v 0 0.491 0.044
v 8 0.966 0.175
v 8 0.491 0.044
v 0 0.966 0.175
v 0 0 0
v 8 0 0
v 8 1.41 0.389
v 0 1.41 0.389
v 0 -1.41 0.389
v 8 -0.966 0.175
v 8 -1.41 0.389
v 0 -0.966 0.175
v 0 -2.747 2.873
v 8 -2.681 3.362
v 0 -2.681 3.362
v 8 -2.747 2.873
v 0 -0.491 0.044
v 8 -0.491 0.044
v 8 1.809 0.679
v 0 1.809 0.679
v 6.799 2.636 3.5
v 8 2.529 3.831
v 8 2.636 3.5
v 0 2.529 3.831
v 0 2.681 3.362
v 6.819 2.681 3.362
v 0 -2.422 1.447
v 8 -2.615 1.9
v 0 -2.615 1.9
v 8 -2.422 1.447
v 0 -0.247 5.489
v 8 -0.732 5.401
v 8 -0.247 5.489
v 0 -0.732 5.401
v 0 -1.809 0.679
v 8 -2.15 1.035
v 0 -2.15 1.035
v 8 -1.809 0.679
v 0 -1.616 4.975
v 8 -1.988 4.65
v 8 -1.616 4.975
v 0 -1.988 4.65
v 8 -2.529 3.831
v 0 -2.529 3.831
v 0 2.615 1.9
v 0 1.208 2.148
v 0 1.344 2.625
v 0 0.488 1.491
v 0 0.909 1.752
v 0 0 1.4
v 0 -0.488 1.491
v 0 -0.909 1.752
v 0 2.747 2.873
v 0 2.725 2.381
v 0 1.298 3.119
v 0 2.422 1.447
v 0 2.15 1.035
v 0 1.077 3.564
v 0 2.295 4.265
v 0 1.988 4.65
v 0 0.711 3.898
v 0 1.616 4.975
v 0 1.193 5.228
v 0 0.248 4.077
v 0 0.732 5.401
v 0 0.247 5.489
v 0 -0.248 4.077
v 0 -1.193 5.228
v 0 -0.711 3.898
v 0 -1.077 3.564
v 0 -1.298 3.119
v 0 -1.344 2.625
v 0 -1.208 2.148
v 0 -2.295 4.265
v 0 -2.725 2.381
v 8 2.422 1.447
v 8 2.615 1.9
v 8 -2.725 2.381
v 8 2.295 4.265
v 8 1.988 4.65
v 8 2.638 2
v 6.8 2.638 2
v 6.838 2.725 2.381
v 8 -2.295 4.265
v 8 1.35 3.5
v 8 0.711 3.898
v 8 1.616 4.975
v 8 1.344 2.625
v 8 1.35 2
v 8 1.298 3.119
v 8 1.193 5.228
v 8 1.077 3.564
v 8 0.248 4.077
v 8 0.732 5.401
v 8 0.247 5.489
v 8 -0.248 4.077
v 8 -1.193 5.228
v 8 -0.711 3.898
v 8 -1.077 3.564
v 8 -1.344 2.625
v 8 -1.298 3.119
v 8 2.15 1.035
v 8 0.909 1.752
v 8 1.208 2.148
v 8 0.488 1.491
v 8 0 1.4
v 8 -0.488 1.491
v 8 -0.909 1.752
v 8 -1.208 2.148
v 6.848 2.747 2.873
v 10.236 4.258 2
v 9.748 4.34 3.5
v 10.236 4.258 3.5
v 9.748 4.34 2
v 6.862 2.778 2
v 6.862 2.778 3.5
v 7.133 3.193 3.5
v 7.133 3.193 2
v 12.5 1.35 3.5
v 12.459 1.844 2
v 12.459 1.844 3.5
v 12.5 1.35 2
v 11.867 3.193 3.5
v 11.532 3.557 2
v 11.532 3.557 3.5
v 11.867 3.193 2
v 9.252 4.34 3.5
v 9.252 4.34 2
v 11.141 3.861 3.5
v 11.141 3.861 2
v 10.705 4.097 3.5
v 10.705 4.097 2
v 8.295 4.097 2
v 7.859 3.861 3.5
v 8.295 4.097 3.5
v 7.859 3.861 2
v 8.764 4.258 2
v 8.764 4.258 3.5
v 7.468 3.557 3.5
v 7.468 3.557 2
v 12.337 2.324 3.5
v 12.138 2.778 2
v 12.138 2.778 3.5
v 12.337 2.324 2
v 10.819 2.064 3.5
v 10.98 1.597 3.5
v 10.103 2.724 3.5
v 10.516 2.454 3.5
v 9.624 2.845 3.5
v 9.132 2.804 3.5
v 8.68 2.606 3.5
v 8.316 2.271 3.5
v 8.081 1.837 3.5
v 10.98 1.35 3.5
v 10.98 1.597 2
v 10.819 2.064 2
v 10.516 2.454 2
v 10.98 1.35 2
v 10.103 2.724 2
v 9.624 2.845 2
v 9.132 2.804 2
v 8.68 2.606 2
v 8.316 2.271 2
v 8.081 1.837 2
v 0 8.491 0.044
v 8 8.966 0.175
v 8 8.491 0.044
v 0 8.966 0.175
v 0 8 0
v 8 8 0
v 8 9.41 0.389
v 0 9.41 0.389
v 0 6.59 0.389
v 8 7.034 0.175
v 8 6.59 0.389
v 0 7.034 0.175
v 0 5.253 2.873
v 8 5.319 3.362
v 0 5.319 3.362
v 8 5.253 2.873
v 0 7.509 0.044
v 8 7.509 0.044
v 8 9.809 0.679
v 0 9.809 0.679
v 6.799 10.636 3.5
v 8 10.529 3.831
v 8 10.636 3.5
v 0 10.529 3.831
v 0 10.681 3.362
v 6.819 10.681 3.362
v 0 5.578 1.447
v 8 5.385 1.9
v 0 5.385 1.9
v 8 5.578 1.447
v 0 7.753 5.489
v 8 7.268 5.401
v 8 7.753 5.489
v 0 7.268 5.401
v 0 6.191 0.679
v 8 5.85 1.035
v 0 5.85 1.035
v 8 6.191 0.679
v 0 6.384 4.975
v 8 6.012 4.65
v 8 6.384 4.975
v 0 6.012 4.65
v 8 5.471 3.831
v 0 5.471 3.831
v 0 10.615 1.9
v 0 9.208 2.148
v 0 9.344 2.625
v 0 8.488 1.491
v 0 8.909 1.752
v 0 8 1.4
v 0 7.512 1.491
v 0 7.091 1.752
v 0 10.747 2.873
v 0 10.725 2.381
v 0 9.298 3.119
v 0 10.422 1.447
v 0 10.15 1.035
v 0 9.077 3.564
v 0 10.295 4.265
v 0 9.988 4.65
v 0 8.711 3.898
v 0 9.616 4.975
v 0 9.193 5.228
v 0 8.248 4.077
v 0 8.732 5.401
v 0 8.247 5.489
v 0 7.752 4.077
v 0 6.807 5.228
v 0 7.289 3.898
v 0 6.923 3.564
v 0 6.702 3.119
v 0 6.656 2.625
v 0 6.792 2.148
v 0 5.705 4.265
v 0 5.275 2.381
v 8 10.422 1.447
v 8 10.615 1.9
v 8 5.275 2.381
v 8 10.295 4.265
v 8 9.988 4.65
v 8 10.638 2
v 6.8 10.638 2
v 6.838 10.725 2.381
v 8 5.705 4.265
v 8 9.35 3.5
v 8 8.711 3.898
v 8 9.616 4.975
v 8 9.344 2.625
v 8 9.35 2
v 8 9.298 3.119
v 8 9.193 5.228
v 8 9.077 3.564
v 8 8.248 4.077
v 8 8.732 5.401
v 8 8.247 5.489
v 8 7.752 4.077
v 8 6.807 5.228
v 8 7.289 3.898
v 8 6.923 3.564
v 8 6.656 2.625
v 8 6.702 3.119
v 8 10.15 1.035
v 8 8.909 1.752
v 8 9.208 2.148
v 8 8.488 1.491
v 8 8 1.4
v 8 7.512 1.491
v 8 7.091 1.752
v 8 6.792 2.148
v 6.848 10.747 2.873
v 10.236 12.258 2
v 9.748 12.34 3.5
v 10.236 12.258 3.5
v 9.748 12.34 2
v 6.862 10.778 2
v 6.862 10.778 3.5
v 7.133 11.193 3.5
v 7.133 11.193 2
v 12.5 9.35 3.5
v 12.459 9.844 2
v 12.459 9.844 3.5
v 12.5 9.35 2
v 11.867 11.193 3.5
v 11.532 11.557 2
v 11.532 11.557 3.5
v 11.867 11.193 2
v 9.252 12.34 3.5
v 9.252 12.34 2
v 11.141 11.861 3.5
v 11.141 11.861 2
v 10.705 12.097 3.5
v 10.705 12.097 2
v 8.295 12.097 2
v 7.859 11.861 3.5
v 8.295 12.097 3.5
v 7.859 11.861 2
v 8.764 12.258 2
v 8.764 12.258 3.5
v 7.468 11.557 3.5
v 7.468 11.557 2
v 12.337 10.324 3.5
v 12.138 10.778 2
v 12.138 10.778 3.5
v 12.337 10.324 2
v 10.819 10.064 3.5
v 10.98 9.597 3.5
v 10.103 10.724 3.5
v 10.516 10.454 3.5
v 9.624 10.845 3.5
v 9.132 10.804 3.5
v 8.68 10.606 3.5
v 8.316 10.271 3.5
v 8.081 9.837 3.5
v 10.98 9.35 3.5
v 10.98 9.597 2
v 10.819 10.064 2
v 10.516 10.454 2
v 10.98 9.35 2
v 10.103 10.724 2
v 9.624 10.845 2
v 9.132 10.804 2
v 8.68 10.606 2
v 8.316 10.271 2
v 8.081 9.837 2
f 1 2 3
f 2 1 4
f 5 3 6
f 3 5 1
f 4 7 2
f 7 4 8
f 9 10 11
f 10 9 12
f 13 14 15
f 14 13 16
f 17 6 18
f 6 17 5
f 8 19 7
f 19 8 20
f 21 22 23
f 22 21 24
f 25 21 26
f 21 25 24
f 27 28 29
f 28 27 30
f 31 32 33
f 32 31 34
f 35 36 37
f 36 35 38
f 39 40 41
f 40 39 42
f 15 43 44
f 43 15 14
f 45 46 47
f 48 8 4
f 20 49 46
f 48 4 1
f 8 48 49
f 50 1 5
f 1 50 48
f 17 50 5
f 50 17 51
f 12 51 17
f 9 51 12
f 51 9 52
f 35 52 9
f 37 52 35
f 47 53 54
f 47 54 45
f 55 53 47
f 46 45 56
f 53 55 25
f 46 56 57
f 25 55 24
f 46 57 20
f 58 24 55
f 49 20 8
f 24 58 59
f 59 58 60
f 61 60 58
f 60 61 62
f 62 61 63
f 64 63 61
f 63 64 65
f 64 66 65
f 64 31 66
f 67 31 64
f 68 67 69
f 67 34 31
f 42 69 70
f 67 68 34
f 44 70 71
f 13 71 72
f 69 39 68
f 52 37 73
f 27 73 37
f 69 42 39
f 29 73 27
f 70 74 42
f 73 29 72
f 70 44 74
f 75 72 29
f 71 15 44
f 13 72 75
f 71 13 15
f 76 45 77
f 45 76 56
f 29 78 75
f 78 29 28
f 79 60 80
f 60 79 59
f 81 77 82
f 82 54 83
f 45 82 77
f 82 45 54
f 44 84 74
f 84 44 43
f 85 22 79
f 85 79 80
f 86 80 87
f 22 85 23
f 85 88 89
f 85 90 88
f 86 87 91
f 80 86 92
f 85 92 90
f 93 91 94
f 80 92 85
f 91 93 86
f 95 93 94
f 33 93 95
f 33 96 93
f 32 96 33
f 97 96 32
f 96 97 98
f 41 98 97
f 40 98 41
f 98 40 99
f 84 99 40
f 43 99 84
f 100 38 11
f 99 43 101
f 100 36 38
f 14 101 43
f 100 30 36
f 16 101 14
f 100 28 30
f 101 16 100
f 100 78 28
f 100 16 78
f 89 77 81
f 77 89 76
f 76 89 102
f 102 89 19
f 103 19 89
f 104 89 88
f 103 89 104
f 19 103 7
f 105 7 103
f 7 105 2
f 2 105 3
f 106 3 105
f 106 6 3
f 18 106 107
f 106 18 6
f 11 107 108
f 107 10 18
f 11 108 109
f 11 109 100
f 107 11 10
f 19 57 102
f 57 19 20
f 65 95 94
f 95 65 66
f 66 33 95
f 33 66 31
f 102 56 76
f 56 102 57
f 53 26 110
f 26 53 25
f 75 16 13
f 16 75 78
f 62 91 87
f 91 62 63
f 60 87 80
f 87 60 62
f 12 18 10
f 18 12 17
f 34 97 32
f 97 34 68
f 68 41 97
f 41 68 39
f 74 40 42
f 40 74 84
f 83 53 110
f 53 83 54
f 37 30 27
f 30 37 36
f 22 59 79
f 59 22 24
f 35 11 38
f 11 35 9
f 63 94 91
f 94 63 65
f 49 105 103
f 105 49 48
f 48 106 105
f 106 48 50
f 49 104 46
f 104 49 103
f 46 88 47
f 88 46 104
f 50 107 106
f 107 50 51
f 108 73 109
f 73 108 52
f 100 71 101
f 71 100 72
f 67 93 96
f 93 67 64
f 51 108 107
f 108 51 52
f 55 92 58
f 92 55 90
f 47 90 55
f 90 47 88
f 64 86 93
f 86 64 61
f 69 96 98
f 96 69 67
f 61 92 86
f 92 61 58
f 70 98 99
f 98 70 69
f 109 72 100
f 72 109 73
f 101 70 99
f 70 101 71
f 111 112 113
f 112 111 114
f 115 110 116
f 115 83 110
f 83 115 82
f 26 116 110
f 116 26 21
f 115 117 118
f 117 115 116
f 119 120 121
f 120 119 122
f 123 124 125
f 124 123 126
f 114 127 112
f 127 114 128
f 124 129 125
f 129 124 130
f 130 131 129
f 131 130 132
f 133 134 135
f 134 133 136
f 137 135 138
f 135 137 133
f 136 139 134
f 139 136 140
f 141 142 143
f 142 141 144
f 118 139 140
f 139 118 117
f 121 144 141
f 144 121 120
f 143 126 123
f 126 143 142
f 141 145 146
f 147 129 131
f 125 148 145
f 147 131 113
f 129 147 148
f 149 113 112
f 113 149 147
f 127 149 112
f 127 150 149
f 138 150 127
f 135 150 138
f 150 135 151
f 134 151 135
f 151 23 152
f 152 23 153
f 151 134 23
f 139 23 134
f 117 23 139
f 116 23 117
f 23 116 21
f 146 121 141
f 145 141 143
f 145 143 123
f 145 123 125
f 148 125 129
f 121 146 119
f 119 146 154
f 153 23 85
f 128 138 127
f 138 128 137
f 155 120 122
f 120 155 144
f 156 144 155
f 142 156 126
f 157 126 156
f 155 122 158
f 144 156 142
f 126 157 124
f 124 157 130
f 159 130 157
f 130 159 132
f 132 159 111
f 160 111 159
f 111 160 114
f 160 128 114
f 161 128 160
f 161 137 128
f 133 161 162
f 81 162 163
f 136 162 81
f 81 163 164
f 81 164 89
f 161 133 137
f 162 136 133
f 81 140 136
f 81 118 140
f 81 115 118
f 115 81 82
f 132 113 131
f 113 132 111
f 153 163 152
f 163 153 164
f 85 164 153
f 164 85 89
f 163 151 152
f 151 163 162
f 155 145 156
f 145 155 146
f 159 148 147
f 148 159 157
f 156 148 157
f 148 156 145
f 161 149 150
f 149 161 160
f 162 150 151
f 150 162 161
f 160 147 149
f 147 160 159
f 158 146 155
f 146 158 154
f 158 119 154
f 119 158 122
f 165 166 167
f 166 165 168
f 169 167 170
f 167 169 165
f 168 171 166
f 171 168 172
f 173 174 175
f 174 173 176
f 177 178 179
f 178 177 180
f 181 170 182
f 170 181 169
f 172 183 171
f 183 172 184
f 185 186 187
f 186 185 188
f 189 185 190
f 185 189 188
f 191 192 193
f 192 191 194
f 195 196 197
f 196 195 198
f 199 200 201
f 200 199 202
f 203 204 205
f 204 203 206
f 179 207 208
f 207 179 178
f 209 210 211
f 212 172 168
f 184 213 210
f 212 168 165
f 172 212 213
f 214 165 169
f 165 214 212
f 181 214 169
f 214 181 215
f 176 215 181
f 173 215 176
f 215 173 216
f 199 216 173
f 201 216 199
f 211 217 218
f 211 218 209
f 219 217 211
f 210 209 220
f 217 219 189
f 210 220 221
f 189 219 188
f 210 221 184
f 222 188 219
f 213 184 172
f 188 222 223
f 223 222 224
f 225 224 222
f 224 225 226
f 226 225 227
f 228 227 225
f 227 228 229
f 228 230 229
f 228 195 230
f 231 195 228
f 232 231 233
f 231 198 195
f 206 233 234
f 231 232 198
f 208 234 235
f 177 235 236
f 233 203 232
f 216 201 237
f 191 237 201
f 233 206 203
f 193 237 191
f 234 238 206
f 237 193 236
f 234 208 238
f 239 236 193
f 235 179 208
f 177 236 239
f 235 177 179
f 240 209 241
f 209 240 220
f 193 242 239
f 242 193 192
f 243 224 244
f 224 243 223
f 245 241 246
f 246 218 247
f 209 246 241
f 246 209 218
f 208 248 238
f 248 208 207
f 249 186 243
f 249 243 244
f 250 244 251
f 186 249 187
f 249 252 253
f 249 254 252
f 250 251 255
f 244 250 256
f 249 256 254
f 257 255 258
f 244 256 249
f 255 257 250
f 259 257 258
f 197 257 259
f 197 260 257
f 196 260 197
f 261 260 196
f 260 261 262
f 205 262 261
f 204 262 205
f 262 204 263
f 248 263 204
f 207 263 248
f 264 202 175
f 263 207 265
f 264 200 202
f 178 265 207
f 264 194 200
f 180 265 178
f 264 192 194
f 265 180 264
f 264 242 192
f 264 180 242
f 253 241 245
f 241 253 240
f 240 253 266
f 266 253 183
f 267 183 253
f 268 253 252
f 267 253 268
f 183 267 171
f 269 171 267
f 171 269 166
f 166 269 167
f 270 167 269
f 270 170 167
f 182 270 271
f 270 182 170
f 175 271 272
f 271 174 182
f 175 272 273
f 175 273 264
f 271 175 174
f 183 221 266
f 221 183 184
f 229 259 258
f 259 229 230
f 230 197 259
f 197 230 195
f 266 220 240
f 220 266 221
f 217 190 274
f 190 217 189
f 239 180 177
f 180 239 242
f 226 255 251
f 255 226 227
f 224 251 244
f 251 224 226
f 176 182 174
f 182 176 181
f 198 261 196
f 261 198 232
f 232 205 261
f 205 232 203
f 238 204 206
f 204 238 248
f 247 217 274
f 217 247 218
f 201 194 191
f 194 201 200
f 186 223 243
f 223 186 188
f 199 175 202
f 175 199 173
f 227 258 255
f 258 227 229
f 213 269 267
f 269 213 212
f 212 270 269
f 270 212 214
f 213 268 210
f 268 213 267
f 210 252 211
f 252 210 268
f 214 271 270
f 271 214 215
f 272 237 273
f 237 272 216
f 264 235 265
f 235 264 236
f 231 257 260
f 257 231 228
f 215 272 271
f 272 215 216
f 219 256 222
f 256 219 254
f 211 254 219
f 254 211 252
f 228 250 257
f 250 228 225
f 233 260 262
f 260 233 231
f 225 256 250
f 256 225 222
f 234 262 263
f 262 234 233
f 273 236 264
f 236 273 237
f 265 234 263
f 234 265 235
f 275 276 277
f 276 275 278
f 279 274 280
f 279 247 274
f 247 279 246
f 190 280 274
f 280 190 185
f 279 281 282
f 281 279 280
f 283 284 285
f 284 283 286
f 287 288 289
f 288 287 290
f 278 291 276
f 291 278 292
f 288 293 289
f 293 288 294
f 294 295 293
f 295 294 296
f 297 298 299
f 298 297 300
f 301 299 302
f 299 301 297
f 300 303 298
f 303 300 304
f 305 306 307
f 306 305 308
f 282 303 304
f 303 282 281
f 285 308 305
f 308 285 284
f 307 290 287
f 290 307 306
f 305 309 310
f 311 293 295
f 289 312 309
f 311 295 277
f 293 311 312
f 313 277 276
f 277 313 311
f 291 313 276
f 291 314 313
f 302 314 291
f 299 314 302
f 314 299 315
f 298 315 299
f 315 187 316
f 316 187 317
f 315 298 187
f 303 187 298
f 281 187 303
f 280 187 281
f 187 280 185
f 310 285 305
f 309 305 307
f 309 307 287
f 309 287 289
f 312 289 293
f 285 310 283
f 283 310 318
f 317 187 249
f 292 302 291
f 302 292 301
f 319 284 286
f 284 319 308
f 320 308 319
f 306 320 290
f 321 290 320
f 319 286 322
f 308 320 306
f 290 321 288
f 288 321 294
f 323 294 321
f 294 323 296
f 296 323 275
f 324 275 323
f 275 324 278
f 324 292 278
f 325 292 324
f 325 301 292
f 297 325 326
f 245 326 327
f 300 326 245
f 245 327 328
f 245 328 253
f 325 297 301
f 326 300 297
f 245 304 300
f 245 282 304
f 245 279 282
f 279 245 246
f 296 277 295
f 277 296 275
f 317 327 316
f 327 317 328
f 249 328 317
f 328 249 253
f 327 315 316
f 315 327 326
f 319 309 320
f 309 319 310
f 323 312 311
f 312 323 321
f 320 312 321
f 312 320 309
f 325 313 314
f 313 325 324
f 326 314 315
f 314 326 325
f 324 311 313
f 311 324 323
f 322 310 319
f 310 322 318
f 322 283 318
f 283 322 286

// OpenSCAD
$fa=4;
$fs=0.5;

inner = 2.5;
tolerance = 0.1;
length = 14;
thickness = 1.5;

translate([0,0,inner/2 + thickness]) rotate([0,90,0]) hook();
translate([0,8,inner/2 + thickness]) rotate([0,90,0]) hook();

module hook() {
	it = inner/2 + tolerance;
	union() {
		tube(inner/2 + thickness, it, 8);
		translate([-thickness/2,it,9.5]) rotate([0,90,0]) pie_slice(3, 1.5, 180, thickness);
	}
}

///////////////////////////

module tube(outer_radius, inner_radius, height) {
    difference() {
        cylinder(h = height, r = outer_radius);
        translate([ 0, 0, -1]) cylinder(h = height + 2, r = inner_radius);
    }
}

module pie_slice(outer_radius, inner_radius, angle, height) {
    o1 = outer_radius + 1;
    blocking_half = [2* o1, o1, height + 1];
	blocking_quarter = [o1, o1, height + 1];
	if (angle <= 0) {
		//nothing
	} else if (angle <= 90) {
		difference() {
			tube(outer_radius, inner_radius, height);
			translate([-o1, -o1, -0.5]) cube(blocking_half);
			translate([-o1, -0.5, -0.5]) cube(blocking_quarter);
			rotate([0,0,angle]) translate([0, 0, -0.5]) cube(blocking_quarter);
		}
	} else if (angle <= 180) {
		difference() {
			tube(outer_radius, inner_radius, height);
			translate([-o1, -o1, -0.5]) cube(blocking_half);
			rotate([0,0,angle]) translate([0, 0, -0.5]) cube(blocking_quarter);
		}
	} else if (angle <= 270) {
		difference() {
			tube(outer_radius, inner_radius, height);
			translate([0, -o1, -0.5]) cube(blocking_quarter);
			rotate([0,0,angle]) translate([0, 0, -0.5]) cube(blocking_quarter);
		}
	} else if (angle <= 360) {
		difference() {
			tube(outer_radius, inner_radius, height);
			intersection() {
				translate([0, -o1, -0.5]) cube(blocking_quarter);
				rotate([0,0,angle]) translate([0, 0, -0.5]) cube(blocking_quarter);
			}
		}
	} else {
		tube(outer_radius, inner_radius, height);
	}
}
